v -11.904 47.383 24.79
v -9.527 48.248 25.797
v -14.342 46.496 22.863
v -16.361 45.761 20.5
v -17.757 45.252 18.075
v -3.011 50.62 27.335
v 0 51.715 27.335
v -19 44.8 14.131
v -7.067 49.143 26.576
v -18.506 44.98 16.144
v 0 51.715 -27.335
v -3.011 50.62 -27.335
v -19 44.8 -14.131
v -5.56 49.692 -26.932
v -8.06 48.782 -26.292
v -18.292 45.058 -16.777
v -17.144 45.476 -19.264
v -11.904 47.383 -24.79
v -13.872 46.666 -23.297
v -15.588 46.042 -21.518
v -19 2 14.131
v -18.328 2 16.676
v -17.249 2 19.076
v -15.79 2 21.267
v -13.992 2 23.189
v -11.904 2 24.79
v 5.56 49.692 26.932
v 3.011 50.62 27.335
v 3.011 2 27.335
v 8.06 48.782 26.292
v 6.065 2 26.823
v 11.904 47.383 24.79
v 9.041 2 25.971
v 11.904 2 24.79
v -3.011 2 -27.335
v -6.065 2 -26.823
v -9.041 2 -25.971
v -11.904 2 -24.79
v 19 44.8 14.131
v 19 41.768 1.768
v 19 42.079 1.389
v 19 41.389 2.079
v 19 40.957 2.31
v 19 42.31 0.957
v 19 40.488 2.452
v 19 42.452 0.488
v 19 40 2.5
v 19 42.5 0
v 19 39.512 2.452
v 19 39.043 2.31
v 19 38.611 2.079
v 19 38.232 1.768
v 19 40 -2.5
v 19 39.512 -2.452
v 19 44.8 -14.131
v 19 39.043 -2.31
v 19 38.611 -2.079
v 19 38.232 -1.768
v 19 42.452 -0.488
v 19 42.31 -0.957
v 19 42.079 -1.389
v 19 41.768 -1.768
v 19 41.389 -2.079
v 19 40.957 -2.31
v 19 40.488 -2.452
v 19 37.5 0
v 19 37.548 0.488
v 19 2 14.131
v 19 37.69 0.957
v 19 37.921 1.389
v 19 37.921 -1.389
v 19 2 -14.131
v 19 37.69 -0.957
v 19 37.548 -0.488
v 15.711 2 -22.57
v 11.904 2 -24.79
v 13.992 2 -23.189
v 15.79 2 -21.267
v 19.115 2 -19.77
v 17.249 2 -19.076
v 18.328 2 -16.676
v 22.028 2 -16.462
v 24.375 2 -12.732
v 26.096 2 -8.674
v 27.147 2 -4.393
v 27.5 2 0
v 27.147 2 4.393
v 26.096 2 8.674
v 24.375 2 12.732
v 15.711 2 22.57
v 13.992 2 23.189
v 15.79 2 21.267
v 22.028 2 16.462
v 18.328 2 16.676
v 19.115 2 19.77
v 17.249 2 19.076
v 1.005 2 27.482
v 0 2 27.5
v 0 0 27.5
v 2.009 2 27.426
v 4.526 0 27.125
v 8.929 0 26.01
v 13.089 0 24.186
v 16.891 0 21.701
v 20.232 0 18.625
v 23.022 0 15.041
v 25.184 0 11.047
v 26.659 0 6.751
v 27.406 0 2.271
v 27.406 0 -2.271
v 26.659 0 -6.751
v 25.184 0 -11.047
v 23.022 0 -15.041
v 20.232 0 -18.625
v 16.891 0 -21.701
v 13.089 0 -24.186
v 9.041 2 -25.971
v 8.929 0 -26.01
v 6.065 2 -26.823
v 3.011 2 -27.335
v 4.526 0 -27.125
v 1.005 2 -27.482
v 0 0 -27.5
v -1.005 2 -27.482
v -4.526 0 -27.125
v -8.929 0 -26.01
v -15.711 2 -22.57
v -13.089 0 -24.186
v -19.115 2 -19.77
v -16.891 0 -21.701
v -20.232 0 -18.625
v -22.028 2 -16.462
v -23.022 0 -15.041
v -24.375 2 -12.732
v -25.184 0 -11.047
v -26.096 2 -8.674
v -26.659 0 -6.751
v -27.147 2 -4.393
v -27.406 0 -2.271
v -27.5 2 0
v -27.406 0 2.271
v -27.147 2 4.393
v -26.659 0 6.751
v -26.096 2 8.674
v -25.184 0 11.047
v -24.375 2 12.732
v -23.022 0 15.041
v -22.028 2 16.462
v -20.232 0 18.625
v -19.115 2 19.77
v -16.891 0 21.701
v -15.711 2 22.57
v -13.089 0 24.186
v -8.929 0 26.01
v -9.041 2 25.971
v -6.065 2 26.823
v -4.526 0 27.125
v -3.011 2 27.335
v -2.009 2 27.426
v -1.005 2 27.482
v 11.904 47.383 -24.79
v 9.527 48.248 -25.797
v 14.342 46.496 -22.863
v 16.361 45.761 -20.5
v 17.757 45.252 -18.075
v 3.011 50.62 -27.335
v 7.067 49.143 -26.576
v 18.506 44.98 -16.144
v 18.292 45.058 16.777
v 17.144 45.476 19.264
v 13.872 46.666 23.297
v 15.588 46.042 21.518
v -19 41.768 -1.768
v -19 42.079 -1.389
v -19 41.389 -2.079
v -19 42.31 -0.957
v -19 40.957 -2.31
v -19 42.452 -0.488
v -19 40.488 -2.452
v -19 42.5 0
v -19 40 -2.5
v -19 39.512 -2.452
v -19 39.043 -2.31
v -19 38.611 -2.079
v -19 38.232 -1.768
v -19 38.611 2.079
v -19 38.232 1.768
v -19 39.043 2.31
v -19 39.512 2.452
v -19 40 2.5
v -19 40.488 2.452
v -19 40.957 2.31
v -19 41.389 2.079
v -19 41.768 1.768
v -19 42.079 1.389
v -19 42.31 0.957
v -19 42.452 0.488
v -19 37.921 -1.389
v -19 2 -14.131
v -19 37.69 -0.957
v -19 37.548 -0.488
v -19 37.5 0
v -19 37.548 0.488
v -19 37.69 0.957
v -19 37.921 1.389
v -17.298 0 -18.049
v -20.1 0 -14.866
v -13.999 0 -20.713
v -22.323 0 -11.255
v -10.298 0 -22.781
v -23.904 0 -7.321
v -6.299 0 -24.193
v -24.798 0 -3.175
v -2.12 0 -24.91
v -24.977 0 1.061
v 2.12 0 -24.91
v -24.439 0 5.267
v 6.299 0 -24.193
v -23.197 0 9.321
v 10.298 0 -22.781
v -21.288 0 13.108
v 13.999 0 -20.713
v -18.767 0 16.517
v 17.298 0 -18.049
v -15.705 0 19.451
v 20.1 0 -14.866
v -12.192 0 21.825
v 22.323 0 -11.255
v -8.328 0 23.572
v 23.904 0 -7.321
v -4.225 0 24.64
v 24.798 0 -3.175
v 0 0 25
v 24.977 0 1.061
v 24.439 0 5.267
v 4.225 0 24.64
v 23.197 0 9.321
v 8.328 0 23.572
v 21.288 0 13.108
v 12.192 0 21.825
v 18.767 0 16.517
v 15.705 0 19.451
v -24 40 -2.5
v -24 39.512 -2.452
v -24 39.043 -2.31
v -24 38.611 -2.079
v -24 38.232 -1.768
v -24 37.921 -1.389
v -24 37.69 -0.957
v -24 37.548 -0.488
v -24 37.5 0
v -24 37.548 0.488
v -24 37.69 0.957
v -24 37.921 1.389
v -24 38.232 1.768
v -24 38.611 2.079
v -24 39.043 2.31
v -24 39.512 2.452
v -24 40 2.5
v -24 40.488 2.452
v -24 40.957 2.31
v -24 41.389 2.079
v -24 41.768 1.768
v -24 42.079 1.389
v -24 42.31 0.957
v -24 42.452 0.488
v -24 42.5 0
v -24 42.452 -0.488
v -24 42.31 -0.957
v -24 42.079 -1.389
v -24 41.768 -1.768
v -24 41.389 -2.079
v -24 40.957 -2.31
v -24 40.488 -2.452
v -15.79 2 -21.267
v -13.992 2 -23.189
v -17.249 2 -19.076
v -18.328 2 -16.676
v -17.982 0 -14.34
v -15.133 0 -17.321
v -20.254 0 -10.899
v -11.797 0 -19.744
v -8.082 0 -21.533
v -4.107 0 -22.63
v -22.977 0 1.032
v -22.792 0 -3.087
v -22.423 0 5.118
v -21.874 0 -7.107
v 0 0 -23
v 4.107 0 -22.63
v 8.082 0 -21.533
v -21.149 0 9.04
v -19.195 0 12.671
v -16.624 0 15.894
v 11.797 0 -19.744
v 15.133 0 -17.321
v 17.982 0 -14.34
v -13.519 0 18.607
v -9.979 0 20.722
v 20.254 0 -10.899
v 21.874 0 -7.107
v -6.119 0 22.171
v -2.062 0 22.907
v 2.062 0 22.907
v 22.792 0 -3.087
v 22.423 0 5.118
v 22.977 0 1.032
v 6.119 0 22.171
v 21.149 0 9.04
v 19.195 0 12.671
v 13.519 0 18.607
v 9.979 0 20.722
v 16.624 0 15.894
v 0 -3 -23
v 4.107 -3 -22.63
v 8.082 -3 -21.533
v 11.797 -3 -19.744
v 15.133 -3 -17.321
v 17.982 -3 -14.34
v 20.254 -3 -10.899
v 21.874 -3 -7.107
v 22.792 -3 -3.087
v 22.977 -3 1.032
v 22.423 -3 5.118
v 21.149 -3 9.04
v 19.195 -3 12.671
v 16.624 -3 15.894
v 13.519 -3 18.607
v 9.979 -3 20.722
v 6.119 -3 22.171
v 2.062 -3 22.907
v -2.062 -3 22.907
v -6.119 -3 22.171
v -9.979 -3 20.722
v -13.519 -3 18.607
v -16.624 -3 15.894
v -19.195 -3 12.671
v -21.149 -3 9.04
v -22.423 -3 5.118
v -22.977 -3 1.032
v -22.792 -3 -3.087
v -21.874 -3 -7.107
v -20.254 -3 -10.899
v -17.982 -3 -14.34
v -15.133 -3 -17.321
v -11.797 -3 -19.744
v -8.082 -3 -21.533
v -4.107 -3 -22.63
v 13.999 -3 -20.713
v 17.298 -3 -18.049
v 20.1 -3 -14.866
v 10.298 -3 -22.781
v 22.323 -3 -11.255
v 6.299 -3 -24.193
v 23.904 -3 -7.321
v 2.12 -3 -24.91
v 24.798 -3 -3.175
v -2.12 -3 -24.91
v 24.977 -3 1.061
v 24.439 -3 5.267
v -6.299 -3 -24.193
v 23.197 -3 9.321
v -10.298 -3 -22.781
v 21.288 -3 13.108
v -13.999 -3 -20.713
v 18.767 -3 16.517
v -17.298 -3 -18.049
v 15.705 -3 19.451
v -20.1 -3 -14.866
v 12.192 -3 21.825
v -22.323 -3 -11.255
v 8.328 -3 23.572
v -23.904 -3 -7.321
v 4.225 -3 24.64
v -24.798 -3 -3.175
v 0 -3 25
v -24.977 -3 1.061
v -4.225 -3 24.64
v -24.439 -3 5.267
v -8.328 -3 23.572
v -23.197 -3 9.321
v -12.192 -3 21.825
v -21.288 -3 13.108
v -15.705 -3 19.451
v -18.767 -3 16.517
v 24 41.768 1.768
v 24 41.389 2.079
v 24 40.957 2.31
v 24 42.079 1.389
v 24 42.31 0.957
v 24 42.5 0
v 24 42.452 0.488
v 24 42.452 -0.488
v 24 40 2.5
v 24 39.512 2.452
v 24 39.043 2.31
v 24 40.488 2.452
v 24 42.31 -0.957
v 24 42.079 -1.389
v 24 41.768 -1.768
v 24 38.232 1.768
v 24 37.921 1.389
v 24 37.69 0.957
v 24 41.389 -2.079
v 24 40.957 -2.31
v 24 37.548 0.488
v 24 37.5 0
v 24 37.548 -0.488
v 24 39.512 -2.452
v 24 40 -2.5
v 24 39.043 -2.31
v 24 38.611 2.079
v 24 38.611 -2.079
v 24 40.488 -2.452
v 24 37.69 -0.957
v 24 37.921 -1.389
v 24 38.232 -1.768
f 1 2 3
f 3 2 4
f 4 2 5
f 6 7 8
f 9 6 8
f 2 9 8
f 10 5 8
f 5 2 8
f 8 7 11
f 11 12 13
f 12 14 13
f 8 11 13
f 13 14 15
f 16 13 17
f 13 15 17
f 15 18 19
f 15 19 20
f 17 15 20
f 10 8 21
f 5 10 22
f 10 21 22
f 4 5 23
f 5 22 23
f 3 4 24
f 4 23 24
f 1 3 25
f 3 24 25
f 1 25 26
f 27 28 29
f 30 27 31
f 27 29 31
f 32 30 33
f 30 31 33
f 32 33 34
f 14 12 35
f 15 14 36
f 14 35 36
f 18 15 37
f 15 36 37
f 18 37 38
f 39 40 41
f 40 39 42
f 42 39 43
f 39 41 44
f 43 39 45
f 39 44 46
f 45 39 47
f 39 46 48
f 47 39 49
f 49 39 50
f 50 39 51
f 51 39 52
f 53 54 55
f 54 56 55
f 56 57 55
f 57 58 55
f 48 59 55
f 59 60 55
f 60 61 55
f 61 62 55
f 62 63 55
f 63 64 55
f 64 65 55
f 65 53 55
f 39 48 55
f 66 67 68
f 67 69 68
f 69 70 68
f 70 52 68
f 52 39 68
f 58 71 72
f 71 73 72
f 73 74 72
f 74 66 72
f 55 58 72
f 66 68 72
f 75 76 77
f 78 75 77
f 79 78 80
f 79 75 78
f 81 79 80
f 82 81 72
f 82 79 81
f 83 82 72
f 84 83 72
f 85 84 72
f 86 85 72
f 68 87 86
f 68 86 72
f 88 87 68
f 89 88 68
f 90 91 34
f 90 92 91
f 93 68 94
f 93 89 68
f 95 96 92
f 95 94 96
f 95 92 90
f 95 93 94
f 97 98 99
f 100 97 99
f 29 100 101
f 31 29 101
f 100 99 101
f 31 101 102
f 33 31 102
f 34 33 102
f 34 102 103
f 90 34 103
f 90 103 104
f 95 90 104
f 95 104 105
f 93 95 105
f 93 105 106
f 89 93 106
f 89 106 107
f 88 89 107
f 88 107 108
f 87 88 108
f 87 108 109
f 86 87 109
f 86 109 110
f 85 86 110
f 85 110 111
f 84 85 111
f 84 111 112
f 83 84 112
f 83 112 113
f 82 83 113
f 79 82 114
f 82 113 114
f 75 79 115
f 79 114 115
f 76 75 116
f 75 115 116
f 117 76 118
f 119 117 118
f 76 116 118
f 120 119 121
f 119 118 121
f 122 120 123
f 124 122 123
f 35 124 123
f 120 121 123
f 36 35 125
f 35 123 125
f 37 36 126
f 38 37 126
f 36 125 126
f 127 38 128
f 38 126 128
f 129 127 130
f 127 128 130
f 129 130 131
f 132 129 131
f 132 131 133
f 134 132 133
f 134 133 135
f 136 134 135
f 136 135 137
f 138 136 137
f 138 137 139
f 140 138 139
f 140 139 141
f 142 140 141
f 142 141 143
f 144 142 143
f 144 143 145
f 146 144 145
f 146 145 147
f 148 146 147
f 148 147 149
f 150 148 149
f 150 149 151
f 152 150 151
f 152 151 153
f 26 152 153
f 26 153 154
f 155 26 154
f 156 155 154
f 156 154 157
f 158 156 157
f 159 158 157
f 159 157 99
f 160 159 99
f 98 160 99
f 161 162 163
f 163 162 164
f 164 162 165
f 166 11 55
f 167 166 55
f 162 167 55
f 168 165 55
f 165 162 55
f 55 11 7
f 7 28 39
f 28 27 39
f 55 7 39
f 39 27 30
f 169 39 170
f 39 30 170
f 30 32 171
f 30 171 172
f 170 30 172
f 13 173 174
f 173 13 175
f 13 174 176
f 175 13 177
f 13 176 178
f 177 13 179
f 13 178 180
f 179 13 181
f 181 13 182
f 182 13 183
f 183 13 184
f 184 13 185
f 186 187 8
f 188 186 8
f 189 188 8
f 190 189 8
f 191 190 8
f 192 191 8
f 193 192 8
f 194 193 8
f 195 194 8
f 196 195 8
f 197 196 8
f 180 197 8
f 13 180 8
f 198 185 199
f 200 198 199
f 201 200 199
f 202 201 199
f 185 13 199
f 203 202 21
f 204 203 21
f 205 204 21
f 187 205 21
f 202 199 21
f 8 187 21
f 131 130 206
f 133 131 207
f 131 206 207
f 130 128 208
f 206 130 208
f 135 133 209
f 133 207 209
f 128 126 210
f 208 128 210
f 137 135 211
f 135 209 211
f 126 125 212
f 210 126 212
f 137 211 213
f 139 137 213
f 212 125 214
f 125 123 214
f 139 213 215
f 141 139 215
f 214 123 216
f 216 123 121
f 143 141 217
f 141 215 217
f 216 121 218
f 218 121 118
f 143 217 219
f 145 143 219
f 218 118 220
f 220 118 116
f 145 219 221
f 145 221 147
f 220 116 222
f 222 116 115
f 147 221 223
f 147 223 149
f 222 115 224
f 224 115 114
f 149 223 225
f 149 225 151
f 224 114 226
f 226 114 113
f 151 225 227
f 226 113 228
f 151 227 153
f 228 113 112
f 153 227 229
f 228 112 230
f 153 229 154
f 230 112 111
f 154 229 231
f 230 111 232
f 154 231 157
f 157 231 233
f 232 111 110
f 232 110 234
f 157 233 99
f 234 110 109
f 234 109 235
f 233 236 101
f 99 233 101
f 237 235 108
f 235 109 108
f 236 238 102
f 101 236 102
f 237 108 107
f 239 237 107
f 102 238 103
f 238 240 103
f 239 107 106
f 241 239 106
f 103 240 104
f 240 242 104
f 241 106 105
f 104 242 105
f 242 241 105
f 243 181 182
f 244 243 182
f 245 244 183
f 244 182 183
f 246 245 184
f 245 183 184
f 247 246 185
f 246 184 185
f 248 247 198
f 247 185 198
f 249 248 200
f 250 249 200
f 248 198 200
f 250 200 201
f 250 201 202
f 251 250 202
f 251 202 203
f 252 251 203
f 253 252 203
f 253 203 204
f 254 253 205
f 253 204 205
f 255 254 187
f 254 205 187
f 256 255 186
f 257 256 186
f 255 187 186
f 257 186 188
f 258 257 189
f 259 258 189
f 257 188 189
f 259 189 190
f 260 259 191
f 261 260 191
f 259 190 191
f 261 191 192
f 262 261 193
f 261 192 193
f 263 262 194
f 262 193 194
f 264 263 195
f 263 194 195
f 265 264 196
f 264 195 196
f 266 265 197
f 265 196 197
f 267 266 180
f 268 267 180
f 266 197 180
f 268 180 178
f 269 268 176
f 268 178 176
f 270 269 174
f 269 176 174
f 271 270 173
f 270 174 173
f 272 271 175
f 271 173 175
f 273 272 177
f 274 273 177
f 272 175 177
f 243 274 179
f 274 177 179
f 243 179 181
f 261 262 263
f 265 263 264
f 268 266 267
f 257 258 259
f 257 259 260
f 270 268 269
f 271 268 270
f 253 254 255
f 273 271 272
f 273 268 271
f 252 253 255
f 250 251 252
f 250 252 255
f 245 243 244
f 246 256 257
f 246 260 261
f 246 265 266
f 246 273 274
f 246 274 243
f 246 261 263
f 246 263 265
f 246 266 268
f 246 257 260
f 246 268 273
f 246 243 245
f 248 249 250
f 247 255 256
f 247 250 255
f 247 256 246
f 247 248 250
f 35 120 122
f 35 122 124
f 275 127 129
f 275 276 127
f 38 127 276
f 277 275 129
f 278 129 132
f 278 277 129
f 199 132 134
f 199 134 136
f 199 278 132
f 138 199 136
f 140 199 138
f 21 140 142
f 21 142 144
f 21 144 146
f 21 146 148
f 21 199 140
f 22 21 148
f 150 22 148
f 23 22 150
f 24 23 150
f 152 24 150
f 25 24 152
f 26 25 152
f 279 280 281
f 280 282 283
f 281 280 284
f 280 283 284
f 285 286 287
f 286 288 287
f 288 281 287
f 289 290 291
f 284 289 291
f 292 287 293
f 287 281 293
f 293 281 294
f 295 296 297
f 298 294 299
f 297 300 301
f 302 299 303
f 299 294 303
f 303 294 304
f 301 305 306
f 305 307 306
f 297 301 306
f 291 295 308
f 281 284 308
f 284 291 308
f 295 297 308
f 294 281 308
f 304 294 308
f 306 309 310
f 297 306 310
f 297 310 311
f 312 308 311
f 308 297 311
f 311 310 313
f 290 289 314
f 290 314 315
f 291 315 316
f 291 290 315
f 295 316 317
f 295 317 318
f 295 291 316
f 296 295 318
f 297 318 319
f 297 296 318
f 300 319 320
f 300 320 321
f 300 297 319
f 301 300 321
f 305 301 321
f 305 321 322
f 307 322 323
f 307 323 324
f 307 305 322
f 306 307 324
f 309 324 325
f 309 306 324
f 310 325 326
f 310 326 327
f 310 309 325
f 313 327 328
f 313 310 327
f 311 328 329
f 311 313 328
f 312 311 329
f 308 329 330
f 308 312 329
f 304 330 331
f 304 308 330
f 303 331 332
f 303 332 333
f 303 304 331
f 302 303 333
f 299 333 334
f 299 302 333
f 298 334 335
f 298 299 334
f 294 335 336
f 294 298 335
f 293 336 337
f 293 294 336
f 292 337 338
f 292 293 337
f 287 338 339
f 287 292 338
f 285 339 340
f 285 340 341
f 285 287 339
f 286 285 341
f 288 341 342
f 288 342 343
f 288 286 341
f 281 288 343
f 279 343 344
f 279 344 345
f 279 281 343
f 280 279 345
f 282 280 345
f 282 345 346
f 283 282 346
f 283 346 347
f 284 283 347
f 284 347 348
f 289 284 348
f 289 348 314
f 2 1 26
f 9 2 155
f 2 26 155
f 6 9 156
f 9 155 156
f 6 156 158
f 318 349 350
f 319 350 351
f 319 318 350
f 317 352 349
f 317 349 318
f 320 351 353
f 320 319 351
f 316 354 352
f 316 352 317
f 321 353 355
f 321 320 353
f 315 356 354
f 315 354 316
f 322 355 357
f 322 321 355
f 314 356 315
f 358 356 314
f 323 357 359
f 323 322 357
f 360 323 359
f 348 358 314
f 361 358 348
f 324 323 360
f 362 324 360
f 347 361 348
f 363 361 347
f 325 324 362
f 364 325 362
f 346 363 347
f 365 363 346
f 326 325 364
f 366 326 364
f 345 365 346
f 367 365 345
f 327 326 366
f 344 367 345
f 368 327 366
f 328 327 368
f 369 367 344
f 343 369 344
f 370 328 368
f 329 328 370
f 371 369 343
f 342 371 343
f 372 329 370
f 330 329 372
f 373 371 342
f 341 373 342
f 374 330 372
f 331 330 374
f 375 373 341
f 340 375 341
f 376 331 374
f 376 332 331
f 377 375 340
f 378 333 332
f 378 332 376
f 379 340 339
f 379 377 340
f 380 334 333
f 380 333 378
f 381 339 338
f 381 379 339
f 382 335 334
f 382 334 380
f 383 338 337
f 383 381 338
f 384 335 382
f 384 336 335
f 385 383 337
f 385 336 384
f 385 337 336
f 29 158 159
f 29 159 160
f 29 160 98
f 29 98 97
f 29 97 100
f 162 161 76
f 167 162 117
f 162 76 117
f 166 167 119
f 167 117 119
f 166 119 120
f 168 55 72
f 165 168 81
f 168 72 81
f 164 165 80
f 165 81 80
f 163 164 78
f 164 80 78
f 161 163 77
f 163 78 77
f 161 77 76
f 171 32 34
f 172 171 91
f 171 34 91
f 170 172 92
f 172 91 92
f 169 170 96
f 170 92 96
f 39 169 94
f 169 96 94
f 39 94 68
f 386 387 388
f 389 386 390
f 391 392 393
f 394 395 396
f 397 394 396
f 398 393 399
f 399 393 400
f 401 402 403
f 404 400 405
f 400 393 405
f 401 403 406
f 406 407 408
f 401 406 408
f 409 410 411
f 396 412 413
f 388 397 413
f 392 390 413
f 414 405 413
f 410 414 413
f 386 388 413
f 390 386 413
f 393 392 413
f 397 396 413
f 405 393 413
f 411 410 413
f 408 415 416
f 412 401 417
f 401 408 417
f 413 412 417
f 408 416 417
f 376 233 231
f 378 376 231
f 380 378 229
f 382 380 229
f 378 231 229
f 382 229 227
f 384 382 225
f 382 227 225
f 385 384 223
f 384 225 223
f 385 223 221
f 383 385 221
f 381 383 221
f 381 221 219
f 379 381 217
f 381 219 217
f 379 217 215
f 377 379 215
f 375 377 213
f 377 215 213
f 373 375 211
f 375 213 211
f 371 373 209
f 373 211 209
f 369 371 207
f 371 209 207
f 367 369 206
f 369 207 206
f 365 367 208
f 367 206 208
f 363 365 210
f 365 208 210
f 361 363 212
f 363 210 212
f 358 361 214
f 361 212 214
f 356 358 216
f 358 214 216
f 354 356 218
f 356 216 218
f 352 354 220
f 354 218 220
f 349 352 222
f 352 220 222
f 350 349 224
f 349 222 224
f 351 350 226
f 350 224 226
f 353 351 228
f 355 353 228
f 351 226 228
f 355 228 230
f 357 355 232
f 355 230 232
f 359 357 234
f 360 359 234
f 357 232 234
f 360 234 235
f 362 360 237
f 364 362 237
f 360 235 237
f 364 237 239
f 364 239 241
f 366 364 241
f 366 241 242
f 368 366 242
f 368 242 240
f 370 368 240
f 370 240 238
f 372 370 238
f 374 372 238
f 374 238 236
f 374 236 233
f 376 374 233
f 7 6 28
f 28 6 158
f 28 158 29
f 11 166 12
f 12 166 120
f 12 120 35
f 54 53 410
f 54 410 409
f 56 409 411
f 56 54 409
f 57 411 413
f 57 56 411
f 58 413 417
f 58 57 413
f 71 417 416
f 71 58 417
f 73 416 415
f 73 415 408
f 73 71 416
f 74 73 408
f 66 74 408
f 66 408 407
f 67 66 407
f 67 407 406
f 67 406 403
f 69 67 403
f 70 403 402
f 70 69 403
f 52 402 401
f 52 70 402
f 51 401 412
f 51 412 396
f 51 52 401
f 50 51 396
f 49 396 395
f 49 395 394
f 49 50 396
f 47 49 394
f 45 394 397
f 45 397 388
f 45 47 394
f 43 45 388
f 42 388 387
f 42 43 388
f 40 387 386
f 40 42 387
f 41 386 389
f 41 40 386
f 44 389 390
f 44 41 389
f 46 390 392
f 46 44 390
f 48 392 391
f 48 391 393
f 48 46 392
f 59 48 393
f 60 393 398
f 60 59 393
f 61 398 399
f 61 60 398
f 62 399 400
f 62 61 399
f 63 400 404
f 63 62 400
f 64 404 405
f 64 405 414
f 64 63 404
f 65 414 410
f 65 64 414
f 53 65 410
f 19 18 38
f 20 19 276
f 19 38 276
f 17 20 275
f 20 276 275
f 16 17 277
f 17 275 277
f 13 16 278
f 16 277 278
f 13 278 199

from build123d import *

# Parameters (mm, degrees)
SKETCH1_R           = 27.5
BOSS_EXTRUDE1_DEPTH = 2
SKETCH2_R           = 25
SKETCH2_R_2         = 23
BOSS_EXTRUDE2_DEPTH = 3
BOSS_EXTRUDE3_DEPTH = 50.8
CHAMFER1_SIZE       = 21.979819356
CHAMFER1_SIZE_2     = 8
SKETCH4_R           = 2.5
BOSS_EXTRUDE4_DEPTH = 5


with BuildPart() as part:
    # Sketch1 → Boss-Extrude1 (new body)
    with BuildSketch(Plane(origin=(0, 0, 0), x_dir=(1, 0, 0), z_dir=(0, 1, 0))):
        with Locations(Location((0, 0, 0), (0, 0, 270))):
            Circle(SKETCH1_R)
    extrude(amount=BOSS_EXTRUDE1_DEPTH)

    # Sketch2 → Boss-Extrude2 (add)
    with BuildSketch(Plane.XZ):
        with Locations(Location((0, 0, 0), (0, 0, 90))):
            Circle(SKETCH2_R)
        with Locations(Location((0, 0, 0), (0, 0, 270))):
            Circle(SKETCH2_R_2, mode=Mode.SUBTRACT)
    extrude(amount=BOSS_EXTRUDE2_DEPTH)

    # Sketch3 → Boss-Extrude3 (add)
    with BuildSketch(Plane(origin=(0, 2, 0), x_dir=(1, 0, 0), z_dir=(0, 1, 0))):
        with BuildLine():
            ThreePointArc((-11.903598775, 24.790206457), (-16.564617944, 20.201602313), (-19, 14.131239727))
            Line((-19, 14.131239727), (-19, -14.131239727))
            ThreePointArc((-19, -14.131239727), (-16.564617944, -20.201602313), (-11.903598775, -24.790206457))
            ThreePointArc((-11.903598775, -24.790206457), (-7.564953068, -26.43901445), (-3.010813341, -27.334684981))
            Line((-3.010813341, -27.334684981), (3.010813341, -27.334684981))
            ThreePointArc((3.010813341, -27.334684981), (7.564953068, -26.43901445), (11.903598775, -24.790206457))
            ThreePointArc((11.903598775, -24.790206457), (16.564617944, -20.201602313), (19, -14.131239727))
            Line((19, -14.131239727), (19, 14.131239727))
            ThreePointArc((19, 14.131239727), (16.564617944, 20.201602313), (11.903598775, 24.790206457))
            ThreePointArc((11.903598775, 24.790206457), (7.564953068, 26.43901445), (3.010813341, 27.334684981))
            Line((3.010813341, 27.334684981), (-3.010813341, 27.334684981))
            ThreePointArc((-3.010813341, 27.334684981), (-7.564953068, 26.43901445), (-11.903598775, 24.790206457))
        make_face()
    extrude(amount=BOSS_EXTRUDE3_DEPTH)

    # Chamfer1
    # the kernel refuses this chamfer: 21.979819356, 8 mm, written as the material it takes off along each edge
    with BuildSketch(Plane(origin=(19, 52.8, 71.151171322), x_dir=(-0.9999130865277316, 0.013184058198645697, 0), z_dir=(0, 0, -1)), Plane(origin=(-19, 52.8, -71.151171322), x_dir=(0.9999130865277316, 0.013184058198645697, 0), z_dir=(0, 0, 1))) as chamfer1_piece_1:
        Polygon((CHAMFER1_SIZE * 0.999913086511, -CHAMFER1_SIZE * 0.0131840581984), (-CHAMFER1_SIZE_2 * 0.0131840581986, -CHAMFER1_SIZE_2 * 0.999913086528), (0, 0), align=None)
    extrude(amount=142.302342643, mode=Mode.SUBTRACT)

    # Sketch4 → Boss-Extrude4 (add)
    with BuildSketch(Plane.ZY.offset(19)):
        with Locations(Location((0, 40, 0), (0, 0, 180))):
            Circle(SKETCH4_R)
    boss_extrude4 = extrude(amount=BOSS_EXTRUDE4_DEPTH)

    # Mirror1: Boss-Extrude4 across plane
    add(boss_extrude4.mirror(Plane(origin=(0, 0, 0), x_dir=(0, 0, 1), z_dir=(1, 0, 0))))


solid = part.part
